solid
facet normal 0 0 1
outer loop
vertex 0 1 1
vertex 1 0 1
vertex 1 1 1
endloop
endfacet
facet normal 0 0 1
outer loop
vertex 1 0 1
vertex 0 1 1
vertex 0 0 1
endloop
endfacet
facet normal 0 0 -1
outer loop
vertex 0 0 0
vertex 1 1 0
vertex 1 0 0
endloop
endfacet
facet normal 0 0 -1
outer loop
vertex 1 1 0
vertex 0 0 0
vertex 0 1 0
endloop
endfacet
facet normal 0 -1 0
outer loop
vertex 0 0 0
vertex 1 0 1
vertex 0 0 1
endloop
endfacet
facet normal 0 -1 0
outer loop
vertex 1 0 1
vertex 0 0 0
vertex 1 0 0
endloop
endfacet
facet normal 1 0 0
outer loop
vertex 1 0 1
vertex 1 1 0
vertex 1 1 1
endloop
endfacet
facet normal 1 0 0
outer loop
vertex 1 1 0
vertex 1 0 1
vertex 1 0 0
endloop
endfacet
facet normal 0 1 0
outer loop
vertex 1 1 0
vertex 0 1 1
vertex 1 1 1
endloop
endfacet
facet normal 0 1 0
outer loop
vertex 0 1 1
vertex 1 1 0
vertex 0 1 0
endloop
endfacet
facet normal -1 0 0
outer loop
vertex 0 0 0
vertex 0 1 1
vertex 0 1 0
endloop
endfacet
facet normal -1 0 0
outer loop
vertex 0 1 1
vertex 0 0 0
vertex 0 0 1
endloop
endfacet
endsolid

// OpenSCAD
translate([0.5000000000, 0.5000000000, 0.5000000000]) {
  translate([-0.5000000000, -0.5000000000, -0.5000000000]) {
    cube([1, 1, 1]);
  }
}
